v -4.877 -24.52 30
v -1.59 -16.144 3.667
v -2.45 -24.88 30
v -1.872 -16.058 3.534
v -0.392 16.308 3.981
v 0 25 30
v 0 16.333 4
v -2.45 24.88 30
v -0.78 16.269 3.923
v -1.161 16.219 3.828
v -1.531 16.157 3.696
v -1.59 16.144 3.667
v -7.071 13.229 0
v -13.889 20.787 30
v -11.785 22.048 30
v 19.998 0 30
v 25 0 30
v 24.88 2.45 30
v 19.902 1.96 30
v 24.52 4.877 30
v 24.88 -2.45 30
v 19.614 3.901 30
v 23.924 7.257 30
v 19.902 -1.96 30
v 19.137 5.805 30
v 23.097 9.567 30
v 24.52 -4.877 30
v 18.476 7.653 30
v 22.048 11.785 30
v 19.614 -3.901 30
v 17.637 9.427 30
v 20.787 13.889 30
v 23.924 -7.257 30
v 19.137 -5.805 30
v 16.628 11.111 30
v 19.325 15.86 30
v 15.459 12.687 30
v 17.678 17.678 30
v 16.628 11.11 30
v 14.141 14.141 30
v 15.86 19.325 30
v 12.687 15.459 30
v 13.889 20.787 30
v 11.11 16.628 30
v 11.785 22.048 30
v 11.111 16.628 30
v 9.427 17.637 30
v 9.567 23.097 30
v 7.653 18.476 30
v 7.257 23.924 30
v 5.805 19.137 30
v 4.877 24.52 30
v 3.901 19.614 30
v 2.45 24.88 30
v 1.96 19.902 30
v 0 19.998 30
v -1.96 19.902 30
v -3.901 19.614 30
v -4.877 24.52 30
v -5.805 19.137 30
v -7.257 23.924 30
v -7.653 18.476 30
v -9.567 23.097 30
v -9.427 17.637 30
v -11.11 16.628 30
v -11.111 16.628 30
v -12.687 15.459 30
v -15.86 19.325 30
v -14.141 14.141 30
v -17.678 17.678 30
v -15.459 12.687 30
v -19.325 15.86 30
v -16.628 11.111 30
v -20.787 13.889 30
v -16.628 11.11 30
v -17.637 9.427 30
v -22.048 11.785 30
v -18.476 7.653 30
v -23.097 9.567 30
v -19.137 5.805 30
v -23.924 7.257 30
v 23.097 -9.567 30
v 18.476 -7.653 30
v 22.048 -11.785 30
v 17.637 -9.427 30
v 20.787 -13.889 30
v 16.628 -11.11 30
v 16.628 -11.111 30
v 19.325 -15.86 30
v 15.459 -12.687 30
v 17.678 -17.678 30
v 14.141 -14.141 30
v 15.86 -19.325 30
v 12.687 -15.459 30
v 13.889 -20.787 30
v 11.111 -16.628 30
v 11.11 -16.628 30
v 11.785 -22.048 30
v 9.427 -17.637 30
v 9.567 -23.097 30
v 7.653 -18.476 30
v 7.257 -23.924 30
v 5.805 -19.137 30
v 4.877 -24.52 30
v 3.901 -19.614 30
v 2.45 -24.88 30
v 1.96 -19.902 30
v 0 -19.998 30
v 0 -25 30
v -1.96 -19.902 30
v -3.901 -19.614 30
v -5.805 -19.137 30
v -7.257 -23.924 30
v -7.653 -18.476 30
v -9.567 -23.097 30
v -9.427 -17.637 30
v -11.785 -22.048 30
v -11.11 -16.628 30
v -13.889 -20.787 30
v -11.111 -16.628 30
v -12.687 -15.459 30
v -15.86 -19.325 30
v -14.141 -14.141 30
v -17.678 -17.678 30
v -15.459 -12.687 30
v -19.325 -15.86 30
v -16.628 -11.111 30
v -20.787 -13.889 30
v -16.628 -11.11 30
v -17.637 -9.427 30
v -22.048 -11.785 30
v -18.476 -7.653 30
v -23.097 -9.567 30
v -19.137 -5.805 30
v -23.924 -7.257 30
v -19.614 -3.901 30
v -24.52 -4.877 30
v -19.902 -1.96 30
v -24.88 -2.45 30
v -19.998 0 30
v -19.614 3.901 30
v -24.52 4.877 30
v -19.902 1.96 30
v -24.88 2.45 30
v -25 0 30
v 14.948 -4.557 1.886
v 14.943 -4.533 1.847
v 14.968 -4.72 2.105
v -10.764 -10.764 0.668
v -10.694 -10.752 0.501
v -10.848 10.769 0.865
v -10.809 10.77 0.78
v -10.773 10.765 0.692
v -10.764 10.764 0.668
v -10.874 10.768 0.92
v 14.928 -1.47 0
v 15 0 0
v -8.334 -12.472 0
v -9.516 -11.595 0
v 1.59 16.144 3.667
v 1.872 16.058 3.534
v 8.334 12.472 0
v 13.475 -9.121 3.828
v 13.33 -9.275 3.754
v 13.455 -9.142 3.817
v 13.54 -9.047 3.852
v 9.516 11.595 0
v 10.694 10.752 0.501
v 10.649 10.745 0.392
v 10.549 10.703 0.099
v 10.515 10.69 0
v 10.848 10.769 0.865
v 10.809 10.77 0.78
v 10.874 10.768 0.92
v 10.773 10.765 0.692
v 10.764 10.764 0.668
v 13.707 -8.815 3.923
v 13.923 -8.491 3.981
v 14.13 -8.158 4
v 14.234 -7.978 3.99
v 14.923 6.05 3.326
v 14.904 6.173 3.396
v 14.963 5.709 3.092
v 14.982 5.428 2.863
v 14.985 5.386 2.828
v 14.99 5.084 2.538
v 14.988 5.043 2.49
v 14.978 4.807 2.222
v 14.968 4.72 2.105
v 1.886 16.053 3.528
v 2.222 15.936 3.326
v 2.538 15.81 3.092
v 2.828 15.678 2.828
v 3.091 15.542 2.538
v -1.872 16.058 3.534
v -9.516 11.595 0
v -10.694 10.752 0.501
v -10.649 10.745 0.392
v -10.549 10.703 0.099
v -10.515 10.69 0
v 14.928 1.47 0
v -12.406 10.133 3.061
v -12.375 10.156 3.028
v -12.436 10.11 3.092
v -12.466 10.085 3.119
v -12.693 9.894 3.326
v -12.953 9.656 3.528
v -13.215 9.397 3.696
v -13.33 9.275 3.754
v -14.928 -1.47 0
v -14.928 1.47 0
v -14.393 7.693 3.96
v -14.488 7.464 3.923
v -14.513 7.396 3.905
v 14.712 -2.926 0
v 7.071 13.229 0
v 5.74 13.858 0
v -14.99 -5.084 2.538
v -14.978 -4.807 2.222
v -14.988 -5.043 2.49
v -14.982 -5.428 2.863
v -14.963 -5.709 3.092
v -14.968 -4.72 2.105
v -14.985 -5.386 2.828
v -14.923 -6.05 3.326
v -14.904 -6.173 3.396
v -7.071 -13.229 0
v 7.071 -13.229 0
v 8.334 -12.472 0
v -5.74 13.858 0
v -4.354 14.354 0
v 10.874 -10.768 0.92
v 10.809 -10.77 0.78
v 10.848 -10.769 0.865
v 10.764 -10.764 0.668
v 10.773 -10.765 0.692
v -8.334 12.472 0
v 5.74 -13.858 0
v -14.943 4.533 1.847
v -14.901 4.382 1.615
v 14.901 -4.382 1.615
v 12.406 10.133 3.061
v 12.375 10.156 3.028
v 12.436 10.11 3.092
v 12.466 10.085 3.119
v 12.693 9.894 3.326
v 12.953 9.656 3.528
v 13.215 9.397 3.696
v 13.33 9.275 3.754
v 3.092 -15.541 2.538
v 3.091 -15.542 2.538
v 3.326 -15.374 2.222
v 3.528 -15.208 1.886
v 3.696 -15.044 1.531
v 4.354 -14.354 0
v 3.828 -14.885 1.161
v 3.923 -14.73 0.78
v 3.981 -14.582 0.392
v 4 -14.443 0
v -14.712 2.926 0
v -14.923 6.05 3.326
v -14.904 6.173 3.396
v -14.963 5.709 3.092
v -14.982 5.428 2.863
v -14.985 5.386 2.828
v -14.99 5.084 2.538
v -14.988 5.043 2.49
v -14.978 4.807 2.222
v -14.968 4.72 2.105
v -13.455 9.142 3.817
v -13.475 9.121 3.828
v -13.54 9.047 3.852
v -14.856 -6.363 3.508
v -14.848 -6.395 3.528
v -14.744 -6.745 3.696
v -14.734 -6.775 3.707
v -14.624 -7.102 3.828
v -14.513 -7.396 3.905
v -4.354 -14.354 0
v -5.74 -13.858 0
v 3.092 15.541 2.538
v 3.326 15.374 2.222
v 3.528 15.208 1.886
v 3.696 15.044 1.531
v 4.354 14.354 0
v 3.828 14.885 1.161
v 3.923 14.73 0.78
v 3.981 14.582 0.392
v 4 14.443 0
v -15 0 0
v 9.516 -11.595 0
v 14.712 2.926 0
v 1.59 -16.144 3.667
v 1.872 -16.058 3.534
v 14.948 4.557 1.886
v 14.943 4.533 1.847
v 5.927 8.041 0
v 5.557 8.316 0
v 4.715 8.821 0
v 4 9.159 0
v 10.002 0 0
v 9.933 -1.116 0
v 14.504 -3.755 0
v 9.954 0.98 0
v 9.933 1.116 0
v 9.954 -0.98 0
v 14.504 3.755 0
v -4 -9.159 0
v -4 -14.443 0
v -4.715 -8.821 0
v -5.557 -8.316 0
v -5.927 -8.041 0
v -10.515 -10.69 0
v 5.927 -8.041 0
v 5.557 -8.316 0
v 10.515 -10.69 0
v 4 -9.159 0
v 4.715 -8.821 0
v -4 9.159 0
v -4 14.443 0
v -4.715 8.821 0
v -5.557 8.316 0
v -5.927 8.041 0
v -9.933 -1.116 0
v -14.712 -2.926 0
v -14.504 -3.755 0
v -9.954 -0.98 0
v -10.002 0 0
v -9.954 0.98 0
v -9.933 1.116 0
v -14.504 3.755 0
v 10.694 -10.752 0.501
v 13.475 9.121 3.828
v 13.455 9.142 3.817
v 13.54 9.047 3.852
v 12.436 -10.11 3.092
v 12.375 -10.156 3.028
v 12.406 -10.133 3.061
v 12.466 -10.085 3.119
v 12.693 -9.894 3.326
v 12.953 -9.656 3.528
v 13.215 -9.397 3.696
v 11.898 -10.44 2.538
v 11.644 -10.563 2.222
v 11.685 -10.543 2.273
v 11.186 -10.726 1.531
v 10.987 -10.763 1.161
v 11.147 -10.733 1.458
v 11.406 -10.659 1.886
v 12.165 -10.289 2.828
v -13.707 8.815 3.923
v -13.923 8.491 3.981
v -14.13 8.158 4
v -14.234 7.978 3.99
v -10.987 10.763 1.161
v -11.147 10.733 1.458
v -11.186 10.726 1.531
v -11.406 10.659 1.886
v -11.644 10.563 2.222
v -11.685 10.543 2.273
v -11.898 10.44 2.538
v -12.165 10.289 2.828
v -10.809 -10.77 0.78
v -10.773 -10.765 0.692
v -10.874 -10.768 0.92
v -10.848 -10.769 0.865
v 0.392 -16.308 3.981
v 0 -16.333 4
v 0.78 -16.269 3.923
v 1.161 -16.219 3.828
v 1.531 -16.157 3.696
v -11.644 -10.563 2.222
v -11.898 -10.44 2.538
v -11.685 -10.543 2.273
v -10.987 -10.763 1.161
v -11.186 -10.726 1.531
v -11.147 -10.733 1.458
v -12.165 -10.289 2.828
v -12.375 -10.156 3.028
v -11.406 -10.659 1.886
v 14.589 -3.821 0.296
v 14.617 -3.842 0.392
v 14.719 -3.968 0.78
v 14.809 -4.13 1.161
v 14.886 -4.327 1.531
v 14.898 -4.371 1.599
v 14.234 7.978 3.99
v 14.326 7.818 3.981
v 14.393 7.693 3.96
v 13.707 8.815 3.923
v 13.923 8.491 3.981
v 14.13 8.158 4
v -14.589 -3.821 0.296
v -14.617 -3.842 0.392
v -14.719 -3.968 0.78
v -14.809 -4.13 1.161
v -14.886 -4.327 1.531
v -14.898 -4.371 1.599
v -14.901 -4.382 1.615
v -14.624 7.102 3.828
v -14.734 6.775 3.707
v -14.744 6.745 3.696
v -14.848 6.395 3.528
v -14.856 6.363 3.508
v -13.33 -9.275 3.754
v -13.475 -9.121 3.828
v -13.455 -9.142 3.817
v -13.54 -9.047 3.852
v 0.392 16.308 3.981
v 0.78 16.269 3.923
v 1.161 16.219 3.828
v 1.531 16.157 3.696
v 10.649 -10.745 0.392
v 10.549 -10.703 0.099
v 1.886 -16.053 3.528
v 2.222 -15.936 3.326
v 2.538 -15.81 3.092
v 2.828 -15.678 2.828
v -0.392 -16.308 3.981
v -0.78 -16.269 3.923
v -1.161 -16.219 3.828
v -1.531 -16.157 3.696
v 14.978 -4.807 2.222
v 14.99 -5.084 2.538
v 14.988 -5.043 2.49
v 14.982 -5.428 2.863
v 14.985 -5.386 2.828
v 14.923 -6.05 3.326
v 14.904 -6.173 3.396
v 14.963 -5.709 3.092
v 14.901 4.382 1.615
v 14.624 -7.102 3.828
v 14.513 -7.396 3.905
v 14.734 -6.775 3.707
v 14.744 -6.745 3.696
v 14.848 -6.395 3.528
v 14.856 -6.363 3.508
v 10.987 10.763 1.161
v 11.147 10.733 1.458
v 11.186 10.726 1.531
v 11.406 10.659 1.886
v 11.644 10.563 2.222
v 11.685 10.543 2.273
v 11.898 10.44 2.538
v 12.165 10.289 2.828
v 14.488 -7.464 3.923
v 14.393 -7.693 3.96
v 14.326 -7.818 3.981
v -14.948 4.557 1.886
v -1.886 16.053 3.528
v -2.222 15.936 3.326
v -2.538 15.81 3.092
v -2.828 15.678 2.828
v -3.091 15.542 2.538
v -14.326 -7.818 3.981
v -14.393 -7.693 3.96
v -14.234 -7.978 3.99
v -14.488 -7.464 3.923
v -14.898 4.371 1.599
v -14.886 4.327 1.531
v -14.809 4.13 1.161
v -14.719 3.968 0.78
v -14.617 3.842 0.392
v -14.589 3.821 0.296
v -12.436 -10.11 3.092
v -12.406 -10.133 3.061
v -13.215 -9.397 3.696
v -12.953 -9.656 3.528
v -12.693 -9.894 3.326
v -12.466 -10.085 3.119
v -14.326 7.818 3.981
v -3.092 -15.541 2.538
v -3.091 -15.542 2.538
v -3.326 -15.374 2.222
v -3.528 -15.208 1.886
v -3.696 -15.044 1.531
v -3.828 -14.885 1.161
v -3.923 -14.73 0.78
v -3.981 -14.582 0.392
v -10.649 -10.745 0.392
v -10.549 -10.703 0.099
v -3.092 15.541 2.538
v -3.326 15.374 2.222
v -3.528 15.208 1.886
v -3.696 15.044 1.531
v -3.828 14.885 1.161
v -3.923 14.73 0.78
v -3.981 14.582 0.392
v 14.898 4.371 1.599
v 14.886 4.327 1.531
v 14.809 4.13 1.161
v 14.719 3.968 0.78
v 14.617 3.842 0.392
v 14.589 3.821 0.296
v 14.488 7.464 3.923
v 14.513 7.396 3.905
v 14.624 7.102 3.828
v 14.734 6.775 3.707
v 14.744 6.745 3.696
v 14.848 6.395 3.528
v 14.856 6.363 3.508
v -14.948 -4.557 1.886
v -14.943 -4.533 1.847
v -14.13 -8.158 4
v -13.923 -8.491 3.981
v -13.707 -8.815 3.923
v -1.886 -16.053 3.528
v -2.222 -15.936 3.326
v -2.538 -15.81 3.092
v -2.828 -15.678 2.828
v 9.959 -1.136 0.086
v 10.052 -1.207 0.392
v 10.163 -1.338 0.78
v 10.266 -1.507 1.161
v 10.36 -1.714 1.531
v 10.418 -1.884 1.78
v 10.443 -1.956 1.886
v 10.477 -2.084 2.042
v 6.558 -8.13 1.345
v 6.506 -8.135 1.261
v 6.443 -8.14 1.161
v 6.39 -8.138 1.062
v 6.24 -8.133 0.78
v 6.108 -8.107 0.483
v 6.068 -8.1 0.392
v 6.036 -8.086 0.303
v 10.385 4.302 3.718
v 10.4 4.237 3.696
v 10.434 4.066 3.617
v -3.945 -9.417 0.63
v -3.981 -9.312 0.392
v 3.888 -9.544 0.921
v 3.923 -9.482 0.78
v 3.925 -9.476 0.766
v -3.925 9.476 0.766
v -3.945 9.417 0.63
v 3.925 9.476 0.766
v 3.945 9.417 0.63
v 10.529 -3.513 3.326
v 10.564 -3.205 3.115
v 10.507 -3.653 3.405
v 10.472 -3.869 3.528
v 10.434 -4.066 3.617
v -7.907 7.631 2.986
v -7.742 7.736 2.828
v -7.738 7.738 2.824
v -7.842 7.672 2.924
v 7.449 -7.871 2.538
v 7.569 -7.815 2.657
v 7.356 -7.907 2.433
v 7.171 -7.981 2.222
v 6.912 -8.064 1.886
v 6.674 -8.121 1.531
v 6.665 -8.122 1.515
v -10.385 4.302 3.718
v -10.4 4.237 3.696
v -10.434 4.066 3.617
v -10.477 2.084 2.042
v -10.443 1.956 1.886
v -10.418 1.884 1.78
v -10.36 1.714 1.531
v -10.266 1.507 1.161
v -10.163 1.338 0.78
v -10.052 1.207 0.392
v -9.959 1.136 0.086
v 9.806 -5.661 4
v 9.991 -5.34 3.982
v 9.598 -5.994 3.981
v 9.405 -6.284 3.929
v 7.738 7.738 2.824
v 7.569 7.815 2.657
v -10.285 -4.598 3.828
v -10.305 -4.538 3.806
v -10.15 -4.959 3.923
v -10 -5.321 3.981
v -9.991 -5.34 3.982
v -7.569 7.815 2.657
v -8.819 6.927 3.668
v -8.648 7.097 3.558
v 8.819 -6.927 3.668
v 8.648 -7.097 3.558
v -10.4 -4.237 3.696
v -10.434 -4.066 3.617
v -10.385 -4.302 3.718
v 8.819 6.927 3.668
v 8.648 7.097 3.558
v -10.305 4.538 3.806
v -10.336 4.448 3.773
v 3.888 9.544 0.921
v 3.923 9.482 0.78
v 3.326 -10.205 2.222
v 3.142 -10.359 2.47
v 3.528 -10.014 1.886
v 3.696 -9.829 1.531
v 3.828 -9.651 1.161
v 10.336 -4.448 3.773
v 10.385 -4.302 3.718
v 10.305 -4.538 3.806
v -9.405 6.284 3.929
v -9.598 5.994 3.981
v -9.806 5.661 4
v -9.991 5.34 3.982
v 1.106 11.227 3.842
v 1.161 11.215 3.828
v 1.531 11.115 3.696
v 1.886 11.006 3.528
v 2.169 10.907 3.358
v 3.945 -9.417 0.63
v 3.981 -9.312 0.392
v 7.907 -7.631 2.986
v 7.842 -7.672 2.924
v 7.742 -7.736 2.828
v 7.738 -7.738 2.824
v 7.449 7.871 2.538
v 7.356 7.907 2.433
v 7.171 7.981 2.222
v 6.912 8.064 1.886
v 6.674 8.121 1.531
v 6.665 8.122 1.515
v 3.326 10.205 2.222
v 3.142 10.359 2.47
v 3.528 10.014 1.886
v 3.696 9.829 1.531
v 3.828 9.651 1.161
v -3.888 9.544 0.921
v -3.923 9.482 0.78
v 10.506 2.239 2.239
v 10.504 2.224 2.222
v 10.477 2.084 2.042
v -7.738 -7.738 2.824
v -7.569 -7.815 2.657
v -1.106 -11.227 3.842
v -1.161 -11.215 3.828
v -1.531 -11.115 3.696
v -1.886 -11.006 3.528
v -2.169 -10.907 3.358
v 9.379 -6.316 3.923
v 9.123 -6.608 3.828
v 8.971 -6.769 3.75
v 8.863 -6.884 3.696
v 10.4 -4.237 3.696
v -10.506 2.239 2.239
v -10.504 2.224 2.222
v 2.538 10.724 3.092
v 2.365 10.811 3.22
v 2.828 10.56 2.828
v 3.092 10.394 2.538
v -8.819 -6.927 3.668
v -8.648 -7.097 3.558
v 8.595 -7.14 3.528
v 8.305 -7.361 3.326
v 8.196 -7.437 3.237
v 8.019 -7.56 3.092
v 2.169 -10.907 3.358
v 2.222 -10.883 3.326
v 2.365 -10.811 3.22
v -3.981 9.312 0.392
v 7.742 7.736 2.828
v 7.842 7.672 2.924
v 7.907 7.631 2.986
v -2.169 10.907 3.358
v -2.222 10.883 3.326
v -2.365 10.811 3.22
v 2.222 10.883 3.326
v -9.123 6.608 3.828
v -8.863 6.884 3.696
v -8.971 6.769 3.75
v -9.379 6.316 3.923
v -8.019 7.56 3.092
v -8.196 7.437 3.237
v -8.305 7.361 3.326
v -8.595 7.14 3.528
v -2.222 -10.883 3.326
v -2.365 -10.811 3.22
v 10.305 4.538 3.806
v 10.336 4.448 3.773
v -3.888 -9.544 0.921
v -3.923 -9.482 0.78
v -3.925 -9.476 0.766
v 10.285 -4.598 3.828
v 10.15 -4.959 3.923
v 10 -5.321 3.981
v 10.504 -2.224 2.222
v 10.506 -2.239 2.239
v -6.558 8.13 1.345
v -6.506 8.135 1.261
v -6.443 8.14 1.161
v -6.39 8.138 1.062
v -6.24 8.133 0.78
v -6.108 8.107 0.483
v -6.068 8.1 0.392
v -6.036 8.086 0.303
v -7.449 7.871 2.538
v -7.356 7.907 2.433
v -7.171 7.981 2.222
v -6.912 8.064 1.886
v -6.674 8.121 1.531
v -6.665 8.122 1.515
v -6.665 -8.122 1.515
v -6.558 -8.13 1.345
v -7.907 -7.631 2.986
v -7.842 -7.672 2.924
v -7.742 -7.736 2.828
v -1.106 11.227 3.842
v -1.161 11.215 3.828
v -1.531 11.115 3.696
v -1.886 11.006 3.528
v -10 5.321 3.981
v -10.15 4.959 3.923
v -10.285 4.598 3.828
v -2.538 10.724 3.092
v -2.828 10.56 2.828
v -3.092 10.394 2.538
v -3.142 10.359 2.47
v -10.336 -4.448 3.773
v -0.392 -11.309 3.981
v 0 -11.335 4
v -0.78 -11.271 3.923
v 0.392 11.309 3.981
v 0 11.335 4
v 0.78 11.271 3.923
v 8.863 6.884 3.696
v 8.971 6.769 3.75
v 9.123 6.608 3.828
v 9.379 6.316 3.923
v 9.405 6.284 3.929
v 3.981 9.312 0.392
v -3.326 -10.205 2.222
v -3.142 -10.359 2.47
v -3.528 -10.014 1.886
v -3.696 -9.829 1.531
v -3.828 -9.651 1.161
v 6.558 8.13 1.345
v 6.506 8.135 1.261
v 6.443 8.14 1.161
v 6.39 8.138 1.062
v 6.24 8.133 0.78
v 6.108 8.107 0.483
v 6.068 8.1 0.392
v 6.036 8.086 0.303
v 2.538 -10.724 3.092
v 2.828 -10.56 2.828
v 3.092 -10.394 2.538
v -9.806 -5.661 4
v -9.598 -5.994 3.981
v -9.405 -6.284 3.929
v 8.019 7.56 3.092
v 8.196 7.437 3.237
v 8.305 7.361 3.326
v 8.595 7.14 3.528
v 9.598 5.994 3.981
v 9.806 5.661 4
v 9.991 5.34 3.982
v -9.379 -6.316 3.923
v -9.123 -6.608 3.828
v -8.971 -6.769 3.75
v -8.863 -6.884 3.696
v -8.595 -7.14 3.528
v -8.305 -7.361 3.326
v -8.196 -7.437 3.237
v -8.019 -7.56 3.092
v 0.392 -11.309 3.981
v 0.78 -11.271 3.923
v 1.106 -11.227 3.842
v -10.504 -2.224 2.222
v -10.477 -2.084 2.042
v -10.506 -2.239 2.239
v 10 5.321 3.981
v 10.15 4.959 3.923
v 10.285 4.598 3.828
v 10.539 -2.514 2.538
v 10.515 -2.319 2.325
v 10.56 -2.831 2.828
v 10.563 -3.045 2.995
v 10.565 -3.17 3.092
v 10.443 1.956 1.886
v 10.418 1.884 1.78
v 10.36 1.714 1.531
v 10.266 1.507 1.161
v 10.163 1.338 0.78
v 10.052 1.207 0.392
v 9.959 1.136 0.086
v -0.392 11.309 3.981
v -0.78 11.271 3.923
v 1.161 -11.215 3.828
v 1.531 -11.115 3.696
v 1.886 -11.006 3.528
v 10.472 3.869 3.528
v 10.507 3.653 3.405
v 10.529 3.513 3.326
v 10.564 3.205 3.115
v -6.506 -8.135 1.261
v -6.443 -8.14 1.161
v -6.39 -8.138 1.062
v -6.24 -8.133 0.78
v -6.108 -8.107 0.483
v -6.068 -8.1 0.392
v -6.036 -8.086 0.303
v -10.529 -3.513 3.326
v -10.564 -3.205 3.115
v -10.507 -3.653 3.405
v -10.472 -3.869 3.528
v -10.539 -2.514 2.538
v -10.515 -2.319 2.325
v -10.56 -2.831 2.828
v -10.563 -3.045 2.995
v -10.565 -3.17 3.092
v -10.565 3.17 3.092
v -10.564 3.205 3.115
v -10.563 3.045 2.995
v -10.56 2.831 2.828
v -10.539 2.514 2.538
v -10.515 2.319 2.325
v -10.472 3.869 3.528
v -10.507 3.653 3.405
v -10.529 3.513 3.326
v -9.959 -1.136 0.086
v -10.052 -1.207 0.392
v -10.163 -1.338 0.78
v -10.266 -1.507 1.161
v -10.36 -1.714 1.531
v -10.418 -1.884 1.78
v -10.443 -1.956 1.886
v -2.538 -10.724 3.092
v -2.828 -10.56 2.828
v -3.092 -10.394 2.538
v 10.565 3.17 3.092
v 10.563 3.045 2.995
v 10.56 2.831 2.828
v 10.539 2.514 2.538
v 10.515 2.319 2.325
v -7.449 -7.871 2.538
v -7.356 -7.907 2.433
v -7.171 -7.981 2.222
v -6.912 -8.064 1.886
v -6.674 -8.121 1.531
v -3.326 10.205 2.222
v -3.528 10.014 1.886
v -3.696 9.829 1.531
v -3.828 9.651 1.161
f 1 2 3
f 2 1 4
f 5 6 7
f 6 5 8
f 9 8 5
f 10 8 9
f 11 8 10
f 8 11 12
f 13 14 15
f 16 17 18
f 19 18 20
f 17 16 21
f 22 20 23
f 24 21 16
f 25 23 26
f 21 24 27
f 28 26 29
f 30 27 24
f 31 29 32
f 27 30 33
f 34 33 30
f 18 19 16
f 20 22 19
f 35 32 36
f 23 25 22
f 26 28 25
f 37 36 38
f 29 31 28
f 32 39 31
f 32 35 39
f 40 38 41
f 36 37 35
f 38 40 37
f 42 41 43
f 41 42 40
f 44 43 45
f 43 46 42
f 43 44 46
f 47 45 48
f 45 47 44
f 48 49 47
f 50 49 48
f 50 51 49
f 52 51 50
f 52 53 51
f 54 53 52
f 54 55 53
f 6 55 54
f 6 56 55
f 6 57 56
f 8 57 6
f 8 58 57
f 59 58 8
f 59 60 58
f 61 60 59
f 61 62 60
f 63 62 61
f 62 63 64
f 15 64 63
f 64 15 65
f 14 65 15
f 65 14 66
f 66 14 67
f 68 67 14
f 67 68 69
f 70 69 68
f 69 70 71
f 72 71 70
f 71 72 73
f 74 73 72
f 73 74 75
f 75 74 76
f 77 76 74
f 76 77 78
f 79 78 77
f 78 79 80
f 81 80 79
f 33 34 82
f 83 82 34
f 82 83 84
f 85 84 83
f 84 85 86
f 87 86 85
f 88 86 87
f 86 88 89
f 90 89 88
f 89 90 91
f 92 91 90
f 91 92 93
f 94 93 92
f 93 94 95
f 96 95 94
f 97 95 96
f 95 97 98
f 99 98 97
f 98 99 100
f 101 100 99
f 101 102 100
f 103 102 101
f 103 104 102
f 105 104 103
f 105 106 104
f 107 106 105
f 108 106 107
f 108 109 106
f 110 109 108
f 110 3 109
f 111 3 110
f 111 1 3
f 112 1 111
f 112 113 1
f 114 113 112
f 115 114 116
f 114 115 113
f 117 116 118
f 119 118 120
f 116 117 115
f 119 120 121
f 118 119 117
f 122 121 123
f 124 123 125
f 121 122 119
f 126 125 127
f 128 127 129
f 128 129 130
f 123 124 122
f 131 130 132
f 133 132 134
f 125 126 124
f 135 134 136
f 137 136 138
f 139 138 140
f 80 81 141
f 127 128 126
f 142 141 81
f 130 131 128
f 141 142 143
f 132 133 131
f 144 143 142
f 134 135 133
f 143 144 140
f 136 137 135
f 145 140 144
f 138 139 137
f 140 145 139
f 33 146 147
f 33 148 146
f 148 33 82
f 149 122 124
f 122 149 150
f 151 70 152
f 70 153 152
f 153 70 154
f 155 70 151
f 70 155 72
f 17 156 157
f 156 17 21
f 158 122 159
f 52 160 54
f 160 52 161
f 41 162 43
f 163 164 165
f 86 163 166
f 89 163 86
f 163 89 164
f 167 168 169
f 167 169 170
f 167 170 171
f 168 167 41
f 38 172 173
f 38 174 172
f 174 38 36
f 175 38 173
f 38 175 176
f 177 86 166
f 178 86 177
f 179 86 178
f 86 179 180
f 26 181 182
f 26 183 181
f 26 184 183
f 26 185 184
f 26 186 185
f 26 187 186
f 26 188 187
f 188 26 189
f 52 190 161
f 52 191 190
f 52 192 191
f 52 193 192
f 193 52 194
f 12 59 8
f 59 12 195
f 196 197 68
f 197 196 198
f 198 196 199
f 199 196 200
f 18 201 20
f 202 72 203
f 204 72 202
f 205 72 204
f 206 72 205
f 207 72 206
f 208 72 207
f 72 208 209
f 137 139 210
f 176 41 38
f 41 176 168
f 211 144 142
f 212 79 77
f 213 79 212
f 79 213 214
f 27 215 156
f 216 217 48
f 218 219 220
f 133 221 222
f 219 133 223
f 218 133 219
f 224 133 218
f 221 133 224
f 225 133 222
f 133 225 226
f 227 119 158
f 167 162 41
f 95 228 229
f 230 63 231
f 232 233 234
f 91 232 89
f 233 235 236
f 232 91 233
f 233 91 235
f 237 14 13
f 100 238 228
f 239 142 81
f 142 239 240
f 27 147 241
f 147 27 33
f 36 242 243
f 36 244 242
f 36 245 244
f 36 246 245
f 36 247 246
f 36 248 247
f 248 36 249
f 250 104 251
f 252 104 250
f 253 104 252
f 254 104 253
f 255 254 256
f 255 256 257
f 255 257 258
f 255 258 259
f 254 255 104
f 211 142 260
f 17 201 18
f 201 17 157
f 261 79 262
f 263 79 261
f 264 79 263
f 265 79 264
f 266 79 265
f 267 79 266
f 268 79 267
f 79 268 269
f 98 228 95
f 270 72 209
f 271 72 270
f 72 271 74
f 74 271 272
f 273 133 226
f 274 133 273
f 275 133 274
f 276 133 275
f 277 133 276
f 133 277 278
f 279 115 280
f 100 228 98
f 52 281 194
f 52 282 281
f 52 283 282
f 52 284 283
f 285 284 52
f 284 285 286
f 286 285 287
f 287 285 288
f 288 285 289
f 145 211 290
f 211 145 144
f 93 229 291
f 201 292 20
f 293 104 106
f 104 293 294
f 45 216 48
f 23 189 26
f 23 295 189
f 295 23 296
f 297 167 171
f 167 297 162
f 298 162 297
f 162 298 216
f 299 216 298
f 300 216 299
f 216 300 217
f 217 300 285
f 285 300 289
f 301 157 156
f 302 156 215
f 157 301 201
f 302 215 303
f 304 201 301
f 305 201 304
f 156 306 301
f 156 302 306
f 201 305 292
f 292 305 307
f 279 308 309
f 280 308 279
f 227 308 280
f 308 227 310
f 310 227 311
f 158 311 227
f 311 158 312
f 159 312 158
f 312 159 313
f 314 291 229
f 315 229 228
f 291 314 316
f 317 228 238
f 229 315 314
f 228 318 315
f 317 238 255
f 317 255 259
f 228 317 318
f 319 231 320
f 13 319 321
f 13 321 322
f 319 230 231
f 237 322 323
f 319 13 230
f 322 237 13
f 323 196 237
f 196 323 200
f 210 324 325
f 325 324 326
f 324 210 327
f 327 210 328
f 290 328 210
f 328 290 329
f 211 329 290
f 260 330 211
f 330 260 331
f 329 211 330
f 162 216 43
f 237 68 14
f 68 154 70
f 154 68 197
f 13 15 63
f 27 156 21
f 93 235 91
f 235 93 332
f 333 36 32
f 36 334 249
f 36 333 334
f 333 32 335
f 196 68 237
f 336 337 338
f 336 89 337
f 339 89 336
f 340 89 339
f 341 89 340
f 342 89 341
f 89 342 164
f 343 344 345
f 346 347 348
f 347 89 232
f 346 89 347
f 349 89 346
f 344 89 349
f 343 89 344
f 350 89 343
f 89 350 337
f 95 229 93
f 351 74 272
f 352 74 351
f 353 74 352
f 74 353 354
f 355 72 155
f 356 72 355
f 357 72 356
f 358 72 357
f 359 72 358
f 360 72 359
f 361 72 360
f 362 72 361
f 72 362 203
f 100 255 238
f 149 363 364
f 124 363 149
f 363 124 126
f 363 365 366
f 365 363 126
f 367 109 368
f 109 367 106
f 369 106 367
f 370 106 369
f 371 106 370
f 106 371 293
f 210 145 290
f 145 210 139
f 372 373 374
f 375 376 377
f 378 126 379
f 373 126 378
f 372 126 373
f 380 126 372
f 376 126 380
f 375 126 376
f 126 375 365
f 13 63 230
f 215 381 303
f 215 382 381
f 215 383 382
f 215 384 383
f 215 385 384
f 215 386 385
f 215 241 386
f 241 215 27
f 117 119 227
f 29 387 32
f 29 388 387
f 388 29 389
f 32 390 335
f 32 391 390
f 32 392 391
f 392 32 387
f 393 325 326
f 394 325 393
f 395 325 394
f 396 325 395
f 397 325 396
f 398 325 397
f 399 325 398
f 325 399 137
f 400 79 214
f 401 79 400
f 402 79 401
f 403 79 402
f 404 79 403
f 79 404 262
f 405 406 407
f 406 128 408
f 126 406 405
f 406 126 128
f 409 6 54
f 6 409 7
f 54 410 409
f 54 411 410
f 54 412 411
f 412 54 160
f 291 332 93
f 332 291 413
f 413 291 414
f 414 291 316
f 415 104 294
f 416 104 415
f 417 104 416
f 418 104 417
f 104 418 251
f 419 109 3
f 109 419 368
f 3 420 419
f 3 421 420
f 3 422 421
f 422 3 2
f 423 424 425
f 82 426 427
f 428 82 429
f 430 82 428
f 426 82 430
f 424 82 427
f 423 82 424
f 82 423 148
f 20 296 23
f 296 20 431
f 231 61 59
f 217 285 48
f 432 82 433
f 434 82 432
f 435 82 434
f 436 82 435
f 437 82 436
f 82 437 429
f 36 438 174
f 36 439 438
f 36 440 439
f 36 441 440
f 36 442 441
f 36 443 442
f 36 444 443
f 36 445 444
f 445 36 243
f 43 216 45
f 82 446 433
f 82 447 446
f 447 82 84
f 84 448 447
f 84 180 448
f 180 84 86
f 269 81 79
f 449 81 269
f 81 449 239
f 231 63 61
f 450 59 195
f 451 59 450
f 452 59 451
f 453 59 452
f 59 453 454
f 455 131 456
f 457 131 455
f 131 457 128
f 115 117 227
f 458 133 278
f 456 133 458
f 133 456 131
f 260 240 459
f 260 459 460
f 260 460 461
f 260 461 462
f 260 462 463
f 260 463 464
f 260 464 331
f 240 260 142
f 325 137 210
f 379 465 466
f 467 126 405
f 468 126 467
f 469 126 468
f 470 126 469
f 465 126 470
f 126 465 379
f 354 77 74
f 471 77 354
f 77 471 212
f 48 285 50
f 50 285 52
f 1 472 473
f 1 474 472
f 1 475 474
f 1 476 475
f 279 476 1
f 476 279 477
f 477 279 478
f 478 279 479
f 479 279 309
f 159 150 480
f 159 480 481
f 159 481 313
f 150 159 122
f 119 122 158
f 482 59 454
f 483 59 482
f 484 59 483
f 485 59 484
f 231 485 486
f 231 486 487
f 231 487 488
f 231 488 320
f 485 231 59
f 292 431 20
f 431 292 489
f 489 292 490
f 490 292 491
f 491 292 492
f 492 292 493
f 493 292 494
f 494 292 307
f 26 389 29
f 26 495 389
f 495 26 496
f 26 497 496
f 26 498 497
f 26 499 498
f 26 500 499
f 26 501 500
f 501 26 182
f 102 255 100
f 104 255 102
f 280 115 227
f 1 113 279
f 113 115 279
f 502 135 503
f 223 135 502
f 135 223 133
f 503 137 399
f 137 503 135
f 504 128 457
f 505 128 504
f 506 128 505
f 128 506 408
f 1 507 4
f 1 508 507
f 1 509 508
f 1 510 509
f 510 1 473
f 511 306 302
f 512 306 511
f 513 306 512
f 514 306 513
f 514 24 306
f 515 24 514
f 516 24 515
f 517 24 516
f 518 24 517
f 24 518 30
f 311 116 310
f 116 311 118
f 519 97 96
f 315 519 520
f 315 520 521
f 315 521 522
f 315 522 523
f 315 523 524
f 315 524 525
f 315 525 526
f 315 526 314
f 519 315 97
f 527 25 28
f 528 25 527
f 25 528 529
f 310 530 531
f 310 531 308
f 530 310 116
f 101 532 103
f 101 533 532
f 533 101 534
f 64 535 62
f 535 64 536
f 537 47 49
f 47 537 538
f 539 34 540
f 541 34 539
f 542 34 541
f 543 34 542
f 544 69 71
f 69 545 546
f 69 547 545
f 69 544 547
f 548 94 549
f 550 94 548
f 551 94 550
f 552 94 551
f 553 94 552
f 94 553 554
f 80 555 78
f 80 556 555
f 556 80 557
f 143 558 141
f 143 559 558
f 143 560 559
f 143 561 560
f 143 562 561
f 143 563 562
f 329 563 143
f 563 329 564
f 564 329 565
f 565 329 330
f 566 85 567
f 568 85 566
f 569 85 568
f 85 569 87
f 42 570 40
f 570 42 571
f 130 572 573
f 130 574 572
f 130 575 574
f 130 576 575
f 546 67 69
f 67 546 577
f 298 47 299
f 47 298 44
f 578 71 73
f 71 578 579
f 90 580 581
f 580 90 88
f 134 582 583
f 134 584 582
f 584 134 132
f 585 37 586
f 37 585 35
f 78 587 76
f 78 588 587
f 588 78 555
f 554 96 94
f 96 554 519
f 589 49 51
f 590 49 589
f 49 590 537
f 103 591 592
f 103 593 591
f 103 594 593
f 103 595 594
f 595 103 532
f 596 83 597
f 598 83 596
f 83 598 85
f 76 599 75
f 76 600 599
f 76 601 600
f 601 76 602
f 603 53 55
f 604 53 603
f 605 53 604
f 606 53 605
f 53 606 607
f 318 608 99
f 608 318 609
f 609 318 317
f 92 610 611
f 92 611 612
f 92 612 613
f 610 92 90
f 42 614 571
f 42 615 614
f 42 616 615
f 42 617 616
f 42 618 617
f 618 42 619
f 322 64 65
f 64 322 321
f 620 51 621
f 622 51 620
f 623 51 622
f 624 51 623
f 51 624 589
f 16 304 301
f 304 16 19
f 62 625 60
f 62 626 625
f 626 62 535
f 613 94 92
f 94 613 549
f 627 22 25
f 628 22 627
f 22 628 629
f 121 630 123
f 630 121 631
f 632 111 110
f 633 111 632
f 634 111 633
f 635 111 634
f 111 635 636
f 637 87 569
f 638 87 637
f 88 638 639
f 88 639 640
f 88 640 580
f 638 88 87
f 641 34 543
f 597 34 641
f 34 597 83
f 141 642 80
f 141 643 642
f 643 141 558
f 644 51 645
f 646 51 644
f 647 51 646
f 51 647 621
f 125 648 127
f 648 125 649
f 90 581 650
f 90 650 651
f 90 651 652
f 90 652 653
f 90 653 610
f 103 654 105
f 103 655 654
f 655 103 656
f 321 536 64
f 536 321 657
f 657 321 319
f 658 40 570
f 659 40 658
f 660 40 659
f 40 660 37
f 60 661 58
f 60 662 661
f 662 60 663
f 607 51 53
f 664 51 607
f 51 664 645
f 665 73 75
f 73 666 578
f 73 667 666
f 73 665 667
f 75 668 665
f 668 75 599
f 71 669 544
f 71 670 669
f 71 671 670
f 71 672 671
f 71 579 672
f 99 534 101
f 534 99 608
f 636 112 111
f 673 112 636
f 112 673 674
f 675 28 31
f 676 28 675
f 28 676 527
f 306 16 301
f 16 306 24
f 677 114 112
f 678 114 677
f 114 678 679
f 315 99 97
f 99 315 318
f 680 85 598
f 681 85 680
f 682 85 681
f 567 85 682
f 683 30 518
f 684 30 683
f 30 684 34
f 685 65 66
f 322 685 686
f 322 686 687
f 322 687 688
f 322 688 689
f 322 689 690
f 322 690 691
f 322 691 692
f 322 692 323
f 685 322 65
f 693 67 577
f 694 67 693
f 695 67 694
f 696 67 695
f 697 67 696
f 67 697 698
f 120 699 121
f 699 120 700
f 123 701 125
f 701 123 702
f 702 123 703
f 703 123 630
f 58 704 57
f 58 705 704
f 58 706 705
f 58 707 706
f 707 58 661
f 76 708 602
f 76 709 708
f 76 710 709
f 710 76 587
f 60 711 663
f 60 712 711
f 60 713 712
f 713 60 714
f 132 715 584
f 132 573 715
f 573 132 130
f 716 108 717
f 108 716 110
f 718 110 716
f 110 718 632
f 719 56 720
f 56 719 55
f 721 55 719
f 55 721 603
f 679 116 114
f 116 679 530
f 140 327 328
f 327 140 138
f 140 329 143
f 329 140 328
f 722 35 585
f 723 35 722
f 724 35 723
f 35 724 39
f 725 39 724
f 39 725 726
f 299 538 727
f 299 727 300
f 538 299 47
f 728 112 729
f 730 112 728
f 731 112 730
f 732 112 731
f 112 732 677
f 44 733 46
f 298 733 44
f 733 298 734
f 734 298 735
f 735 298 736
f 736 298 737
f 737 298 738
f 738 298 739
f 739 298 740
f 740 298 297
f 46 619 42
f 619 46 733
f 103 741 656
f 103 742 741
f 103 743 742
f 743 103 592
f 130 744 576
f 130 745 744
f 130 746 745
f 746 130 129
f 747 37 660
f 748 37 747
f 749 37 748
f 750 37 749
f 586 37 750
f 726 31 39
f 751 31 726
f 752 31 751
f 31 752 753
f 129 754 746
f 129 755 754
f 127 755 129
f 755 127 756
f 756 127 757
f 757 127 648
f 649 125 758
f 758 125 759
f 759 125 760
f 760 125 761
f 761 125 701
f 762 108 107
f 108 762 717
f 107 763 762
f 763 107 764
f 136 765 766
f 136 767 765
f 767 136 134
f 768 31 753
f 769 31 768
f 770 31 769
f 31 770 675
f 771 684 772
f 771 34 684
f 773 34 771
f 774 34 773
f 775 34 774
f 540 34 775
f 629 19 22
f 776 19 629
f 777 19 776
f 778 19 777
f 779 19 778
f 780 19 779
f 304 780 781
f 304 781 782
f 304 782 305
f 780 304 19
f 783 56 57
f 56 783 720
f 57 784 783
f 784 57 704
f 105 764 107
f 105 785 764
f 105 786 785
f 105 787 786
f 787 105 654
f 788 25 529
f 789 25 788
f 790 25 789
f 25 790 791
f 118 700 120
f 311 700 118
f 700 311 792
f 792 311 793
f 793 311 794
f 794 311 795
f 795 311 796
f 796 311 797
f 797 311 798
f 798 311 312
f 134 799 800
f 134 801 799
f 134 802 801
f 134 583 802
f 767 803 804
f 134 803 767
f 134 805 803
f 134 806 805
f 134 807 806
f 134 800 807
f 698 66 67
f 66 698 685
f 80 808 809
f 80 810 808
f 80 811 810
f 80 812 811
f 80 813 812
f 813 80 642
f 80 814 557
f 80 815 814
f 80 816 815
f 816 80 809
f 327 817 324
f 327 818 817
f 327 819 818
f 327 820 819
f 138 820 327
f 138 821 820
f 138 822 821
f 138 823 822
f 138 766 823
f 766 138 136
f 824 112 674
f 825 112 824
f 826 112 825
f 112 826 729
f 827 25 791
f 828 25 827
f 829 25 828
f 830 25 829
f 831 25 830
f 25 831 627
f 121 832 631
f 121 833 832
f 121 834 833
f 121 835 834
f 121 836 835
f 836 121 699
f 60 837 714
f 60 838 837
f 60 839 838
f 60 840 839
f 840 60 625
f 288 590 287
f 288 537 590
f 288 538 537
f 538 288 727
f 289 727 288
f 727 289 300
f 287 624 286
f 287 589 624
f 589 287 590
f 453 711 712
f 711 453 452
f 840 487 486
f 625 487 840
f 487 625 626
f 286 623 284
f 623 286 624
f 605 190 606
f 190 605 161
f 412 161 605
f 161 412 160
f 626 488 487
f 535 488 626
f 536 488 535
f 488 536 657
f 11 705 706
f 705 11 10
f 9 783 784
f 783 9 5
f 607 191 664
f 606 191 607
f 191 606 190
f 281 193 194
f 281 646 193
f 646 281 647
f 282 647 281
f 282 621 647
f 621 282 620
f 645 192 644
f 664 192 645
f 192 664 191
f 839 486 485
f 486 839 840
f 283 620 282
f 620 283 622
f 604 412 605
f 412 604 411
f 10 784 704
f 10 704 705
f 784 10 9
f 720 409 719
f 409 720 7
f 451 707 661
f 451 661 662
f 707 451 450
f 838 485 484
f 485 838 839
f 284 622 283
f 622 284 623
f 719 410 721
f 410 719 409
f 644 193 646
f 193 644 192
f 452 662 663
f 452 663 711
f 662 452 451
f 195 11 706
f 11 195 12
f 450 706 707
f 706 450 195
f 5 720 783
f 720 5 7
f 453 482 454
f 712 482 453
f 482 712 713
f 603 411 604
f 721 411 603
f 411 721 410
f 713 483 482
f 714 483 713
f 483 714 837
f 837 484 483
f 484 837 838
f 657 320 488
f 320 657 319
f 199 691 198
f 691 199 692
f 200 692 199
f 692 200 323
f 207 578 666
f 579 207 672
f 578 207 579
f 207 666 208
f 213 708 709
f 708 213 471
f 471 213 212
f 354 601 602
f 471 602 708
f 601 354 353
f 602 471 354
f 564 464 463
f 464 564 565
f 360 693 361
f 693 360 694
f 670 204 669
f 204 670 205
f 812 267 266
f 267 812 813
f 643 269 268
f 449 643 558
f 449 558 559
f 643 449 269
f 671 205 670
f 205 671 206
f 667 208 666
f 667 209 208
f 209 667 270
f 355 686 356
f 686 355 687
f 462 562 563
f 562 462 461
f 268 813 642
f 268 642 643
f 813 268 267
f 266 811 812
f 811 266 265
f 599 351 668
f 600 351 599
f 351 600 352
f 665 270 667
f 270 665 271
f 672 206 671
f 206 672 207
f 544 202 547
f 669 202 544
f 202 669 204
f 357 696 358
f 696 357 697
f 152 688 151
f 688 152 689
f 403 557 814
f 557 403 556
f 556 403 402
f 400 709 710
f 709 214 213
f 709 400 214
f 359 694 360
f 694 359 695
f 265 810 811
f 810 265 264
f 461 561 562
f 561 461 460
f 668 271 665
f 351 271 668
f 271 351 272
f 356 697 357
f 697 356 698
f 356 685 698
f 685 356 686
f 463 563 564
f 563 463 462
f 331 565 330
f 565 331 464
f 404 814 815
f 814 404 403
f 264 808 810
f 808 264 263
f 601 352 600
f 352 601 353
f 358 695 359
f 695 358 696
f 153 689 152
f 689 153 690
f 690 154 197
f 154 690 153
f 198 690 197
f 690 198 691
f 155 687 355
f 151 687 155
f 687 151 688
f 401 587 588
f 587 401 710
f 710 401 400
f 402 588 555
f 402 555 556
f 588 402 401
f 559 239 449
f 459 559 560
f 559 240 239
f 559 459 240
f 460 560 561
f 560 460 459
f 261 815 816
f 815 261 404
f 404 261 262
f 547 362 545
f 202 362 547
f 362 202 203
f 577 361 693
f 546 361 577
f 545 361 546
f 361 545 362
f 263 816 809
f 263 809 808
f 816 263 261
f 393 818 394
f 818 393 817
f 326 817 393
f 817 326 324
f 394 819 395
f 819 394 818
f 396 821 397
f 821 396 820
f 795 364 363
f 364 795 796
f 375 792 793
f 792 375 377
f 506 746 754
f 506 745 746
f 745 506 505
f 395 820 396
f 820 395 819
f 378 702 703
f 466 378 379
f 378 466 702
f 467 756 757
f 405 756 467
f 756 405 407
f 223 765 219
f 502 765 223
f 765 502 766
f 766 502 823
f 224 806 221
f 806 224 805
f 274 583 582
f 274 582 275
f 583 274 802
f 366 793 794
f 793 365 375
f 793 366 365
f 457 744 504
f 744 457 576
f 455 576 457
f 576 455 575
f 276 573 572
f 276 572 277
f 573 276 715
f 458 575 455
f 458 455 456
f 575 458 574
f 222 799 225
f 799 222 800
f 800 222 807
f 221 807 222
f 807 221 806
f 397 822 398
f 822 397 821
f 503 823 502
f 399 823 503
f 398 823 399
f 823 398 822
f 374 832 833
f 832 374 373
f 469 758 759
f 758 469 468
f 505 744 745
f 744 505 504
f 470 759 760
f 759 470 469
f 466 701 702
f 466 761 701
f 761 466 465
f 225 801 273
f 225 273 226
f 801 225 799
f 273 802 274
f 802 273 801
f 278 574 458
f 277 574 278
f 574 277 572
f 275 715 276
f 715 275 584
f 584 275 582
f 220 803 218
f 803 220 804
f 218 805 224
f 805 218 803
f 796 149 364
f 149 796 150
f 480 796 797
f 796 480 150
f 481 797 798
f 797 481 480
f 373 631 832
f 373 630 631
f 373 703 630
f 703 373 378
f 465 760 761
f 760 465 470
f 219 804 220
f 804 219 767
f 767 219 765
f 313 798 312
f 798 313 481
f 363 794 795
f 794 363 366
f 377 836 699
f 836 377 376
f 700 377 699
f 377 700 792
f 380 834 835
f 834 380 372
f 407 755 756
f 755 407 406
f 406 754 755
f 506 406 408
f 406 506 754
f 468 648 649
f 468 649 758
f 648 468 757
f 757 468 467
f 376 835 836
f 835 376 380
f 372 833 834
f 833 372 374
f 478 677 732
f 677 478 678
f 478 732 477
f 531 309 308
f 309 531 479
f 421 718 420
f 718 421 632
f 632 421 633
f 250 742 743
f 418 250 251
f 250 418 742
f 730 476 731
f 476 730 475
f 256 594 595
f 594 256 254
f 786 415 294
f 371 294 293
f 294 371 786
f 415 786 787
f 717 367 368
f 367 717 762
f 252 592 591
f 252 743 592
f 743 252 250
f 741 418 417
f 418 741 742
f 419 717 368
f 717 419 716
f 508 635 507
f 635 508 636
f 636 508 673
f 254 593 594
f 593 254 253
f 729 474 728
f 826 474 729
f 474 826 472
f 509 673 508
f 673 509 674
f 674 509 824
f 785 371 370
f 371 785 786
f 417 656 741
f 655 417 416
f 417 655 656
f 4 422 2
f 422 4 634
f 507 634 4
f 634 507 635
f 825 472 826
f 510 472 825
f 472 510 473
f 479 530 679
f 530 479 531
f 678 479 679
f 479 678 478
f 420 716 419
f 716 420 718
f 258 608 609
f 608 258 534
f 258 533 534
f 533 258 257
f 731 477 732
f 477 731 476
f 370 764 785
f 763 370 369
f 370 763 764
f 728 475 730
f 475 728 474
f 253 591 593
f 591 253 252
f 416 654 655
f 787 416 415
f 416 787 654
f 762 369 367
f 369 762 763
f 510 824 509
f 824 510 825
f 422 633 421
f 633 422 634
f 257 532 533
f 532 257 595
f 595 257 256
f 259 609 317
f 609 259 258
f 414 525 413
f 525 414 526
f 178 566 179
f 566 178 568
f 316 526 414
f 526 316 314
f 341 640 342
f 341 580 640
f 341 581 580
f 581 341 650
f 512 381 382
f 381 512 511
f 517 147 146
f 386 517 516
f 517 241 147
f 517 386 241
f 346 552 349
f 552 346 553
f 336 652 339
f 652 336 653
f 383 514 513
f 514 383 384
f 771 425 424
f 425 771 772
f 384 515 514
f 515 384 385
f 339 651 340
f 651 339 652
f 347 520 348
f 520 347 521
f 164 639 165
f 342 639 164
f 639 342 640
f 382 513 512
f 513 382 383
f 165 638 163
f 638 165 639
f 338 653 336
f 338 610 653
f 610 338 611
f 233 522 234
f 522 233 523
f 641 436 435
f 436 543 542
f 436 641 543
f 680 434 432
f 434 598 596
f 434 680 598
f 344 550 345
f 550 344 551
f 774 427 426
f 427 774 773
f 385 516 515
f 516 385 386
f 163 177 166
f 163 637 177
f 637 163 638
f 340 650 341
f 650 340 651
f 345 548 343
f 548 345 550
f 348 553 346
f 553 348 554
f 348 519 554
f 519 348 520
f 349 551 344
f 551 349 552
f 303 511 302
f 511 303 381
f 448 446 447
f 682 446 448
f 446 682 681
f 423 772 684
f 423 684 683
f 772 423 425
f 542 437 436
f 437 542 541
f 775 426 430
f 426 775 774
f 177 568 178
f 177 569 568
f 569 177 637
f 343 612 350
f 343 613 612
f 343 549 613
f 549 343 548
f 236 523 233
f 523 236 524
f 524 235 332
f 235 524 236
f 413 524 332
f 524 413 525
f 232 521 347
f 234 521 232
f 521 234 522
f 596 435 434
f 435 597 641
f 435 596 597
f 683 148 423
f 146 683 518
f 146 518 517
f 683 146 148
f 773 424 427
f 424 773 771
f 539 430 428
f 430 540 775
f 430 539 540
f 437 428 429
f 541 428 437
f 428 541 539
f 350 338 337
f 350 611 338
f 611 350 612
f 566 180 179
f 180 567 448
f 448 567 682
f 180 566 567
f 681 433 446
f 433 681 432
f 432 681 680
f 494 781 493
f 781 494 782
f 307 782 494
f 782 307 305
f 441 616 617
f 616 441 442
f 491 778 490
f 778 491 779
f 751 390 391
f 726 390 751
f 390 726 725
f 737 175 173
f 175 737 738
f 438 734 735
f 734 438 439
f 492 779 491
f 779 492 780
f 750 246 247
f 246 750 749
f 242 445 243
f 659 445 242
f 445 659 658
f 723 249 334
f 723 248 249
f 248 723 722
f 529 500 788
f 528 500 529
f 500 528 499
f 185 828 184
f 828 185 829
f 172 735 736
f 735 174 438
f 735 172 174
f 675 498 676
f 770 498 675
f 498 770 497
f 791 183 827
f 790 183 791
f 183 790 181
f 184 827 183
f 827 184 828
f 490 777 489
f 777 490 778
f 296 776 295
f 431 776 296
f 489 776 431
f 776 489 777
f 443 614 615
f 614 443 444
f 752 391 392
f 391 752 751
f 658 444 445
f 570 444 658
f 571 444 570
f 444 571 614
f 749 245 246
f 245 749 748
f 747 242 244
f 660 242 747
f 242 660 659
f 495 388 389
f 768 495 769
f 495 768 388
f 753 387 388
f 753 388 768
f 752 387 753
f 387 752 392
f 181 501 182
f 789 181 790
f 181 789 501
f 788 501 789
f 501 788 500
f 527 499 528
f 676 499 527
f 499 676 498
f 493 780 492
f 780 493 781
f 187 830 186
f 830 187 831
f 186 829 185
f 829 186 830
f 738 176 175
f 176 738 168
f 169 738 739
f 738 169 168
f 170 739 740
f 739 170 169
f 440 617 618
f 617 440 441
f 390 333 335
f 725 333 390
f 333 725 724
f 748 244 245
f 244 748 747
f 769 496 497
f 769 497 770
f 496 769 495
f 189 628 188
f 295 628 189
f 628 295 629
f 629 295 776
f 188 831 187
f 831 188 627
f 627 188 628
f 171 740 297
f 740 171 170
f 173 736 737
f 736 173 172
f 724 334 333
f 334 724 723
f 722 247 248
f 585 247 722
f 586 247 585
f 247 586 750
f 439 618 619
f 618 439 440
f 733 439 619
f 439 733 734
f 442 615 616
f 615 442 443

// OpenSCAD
// Make a hollow conical support to keep boxes off the damp floor.
// Copyright 2019 Ben Kelley
// This work is licensed under the Creative Commons Attribution-ShareAlike 4.0 International License. To view a copy of this license, visit http://creativecommons.org/licenses/by-sa/4.0/

$fn = 64*1;

topDiameter = 50; //[5:50]
bottomDiameter = 30; //[5:50]
thickness = 5; //[1:10]
height = 30; //[5:80]
bottomCutouts = 6; //[1:10]
cutoutDiameter = 8; //[2:20]

main();

module main() {
    if (bottomCutouts > 0) {
        difference() {
            mainCylinders();
            bottomCutouts();
        }
    } else {
        mainCylinders();
    }
}

module mainCylinders() {
    difference() {
        // Outer Cylinder
        cylinder(h=height, r1=(bottomDiameter / 2), r2=(topDiameter / 2));
        // Inner Cylinder
        translate([0,0,-0.005]) {
            cylinder(h=height+0.01, r1=(bottomDiameter / 2) - thickness, r2=(topDiameter / 2) - thickness);
        }
    }
}

module bottomCutouts() {
    union() {
        for(cutout = [0 : (bottomCutouts - 1)]) {
            rotate ([0,0, ((360 / bottomCutouts) * cutout)]) {
                translate ([0, (bottomDiameter / 2) + 2, 0]) {
                    rotate ([90,0,0]) {
                        cylinder(h=thickness + 5, r1=cutoutDiameter / 2, r2=cutoutDiameter / 2);
                    }
                }
            }
        }        
    }    
}
